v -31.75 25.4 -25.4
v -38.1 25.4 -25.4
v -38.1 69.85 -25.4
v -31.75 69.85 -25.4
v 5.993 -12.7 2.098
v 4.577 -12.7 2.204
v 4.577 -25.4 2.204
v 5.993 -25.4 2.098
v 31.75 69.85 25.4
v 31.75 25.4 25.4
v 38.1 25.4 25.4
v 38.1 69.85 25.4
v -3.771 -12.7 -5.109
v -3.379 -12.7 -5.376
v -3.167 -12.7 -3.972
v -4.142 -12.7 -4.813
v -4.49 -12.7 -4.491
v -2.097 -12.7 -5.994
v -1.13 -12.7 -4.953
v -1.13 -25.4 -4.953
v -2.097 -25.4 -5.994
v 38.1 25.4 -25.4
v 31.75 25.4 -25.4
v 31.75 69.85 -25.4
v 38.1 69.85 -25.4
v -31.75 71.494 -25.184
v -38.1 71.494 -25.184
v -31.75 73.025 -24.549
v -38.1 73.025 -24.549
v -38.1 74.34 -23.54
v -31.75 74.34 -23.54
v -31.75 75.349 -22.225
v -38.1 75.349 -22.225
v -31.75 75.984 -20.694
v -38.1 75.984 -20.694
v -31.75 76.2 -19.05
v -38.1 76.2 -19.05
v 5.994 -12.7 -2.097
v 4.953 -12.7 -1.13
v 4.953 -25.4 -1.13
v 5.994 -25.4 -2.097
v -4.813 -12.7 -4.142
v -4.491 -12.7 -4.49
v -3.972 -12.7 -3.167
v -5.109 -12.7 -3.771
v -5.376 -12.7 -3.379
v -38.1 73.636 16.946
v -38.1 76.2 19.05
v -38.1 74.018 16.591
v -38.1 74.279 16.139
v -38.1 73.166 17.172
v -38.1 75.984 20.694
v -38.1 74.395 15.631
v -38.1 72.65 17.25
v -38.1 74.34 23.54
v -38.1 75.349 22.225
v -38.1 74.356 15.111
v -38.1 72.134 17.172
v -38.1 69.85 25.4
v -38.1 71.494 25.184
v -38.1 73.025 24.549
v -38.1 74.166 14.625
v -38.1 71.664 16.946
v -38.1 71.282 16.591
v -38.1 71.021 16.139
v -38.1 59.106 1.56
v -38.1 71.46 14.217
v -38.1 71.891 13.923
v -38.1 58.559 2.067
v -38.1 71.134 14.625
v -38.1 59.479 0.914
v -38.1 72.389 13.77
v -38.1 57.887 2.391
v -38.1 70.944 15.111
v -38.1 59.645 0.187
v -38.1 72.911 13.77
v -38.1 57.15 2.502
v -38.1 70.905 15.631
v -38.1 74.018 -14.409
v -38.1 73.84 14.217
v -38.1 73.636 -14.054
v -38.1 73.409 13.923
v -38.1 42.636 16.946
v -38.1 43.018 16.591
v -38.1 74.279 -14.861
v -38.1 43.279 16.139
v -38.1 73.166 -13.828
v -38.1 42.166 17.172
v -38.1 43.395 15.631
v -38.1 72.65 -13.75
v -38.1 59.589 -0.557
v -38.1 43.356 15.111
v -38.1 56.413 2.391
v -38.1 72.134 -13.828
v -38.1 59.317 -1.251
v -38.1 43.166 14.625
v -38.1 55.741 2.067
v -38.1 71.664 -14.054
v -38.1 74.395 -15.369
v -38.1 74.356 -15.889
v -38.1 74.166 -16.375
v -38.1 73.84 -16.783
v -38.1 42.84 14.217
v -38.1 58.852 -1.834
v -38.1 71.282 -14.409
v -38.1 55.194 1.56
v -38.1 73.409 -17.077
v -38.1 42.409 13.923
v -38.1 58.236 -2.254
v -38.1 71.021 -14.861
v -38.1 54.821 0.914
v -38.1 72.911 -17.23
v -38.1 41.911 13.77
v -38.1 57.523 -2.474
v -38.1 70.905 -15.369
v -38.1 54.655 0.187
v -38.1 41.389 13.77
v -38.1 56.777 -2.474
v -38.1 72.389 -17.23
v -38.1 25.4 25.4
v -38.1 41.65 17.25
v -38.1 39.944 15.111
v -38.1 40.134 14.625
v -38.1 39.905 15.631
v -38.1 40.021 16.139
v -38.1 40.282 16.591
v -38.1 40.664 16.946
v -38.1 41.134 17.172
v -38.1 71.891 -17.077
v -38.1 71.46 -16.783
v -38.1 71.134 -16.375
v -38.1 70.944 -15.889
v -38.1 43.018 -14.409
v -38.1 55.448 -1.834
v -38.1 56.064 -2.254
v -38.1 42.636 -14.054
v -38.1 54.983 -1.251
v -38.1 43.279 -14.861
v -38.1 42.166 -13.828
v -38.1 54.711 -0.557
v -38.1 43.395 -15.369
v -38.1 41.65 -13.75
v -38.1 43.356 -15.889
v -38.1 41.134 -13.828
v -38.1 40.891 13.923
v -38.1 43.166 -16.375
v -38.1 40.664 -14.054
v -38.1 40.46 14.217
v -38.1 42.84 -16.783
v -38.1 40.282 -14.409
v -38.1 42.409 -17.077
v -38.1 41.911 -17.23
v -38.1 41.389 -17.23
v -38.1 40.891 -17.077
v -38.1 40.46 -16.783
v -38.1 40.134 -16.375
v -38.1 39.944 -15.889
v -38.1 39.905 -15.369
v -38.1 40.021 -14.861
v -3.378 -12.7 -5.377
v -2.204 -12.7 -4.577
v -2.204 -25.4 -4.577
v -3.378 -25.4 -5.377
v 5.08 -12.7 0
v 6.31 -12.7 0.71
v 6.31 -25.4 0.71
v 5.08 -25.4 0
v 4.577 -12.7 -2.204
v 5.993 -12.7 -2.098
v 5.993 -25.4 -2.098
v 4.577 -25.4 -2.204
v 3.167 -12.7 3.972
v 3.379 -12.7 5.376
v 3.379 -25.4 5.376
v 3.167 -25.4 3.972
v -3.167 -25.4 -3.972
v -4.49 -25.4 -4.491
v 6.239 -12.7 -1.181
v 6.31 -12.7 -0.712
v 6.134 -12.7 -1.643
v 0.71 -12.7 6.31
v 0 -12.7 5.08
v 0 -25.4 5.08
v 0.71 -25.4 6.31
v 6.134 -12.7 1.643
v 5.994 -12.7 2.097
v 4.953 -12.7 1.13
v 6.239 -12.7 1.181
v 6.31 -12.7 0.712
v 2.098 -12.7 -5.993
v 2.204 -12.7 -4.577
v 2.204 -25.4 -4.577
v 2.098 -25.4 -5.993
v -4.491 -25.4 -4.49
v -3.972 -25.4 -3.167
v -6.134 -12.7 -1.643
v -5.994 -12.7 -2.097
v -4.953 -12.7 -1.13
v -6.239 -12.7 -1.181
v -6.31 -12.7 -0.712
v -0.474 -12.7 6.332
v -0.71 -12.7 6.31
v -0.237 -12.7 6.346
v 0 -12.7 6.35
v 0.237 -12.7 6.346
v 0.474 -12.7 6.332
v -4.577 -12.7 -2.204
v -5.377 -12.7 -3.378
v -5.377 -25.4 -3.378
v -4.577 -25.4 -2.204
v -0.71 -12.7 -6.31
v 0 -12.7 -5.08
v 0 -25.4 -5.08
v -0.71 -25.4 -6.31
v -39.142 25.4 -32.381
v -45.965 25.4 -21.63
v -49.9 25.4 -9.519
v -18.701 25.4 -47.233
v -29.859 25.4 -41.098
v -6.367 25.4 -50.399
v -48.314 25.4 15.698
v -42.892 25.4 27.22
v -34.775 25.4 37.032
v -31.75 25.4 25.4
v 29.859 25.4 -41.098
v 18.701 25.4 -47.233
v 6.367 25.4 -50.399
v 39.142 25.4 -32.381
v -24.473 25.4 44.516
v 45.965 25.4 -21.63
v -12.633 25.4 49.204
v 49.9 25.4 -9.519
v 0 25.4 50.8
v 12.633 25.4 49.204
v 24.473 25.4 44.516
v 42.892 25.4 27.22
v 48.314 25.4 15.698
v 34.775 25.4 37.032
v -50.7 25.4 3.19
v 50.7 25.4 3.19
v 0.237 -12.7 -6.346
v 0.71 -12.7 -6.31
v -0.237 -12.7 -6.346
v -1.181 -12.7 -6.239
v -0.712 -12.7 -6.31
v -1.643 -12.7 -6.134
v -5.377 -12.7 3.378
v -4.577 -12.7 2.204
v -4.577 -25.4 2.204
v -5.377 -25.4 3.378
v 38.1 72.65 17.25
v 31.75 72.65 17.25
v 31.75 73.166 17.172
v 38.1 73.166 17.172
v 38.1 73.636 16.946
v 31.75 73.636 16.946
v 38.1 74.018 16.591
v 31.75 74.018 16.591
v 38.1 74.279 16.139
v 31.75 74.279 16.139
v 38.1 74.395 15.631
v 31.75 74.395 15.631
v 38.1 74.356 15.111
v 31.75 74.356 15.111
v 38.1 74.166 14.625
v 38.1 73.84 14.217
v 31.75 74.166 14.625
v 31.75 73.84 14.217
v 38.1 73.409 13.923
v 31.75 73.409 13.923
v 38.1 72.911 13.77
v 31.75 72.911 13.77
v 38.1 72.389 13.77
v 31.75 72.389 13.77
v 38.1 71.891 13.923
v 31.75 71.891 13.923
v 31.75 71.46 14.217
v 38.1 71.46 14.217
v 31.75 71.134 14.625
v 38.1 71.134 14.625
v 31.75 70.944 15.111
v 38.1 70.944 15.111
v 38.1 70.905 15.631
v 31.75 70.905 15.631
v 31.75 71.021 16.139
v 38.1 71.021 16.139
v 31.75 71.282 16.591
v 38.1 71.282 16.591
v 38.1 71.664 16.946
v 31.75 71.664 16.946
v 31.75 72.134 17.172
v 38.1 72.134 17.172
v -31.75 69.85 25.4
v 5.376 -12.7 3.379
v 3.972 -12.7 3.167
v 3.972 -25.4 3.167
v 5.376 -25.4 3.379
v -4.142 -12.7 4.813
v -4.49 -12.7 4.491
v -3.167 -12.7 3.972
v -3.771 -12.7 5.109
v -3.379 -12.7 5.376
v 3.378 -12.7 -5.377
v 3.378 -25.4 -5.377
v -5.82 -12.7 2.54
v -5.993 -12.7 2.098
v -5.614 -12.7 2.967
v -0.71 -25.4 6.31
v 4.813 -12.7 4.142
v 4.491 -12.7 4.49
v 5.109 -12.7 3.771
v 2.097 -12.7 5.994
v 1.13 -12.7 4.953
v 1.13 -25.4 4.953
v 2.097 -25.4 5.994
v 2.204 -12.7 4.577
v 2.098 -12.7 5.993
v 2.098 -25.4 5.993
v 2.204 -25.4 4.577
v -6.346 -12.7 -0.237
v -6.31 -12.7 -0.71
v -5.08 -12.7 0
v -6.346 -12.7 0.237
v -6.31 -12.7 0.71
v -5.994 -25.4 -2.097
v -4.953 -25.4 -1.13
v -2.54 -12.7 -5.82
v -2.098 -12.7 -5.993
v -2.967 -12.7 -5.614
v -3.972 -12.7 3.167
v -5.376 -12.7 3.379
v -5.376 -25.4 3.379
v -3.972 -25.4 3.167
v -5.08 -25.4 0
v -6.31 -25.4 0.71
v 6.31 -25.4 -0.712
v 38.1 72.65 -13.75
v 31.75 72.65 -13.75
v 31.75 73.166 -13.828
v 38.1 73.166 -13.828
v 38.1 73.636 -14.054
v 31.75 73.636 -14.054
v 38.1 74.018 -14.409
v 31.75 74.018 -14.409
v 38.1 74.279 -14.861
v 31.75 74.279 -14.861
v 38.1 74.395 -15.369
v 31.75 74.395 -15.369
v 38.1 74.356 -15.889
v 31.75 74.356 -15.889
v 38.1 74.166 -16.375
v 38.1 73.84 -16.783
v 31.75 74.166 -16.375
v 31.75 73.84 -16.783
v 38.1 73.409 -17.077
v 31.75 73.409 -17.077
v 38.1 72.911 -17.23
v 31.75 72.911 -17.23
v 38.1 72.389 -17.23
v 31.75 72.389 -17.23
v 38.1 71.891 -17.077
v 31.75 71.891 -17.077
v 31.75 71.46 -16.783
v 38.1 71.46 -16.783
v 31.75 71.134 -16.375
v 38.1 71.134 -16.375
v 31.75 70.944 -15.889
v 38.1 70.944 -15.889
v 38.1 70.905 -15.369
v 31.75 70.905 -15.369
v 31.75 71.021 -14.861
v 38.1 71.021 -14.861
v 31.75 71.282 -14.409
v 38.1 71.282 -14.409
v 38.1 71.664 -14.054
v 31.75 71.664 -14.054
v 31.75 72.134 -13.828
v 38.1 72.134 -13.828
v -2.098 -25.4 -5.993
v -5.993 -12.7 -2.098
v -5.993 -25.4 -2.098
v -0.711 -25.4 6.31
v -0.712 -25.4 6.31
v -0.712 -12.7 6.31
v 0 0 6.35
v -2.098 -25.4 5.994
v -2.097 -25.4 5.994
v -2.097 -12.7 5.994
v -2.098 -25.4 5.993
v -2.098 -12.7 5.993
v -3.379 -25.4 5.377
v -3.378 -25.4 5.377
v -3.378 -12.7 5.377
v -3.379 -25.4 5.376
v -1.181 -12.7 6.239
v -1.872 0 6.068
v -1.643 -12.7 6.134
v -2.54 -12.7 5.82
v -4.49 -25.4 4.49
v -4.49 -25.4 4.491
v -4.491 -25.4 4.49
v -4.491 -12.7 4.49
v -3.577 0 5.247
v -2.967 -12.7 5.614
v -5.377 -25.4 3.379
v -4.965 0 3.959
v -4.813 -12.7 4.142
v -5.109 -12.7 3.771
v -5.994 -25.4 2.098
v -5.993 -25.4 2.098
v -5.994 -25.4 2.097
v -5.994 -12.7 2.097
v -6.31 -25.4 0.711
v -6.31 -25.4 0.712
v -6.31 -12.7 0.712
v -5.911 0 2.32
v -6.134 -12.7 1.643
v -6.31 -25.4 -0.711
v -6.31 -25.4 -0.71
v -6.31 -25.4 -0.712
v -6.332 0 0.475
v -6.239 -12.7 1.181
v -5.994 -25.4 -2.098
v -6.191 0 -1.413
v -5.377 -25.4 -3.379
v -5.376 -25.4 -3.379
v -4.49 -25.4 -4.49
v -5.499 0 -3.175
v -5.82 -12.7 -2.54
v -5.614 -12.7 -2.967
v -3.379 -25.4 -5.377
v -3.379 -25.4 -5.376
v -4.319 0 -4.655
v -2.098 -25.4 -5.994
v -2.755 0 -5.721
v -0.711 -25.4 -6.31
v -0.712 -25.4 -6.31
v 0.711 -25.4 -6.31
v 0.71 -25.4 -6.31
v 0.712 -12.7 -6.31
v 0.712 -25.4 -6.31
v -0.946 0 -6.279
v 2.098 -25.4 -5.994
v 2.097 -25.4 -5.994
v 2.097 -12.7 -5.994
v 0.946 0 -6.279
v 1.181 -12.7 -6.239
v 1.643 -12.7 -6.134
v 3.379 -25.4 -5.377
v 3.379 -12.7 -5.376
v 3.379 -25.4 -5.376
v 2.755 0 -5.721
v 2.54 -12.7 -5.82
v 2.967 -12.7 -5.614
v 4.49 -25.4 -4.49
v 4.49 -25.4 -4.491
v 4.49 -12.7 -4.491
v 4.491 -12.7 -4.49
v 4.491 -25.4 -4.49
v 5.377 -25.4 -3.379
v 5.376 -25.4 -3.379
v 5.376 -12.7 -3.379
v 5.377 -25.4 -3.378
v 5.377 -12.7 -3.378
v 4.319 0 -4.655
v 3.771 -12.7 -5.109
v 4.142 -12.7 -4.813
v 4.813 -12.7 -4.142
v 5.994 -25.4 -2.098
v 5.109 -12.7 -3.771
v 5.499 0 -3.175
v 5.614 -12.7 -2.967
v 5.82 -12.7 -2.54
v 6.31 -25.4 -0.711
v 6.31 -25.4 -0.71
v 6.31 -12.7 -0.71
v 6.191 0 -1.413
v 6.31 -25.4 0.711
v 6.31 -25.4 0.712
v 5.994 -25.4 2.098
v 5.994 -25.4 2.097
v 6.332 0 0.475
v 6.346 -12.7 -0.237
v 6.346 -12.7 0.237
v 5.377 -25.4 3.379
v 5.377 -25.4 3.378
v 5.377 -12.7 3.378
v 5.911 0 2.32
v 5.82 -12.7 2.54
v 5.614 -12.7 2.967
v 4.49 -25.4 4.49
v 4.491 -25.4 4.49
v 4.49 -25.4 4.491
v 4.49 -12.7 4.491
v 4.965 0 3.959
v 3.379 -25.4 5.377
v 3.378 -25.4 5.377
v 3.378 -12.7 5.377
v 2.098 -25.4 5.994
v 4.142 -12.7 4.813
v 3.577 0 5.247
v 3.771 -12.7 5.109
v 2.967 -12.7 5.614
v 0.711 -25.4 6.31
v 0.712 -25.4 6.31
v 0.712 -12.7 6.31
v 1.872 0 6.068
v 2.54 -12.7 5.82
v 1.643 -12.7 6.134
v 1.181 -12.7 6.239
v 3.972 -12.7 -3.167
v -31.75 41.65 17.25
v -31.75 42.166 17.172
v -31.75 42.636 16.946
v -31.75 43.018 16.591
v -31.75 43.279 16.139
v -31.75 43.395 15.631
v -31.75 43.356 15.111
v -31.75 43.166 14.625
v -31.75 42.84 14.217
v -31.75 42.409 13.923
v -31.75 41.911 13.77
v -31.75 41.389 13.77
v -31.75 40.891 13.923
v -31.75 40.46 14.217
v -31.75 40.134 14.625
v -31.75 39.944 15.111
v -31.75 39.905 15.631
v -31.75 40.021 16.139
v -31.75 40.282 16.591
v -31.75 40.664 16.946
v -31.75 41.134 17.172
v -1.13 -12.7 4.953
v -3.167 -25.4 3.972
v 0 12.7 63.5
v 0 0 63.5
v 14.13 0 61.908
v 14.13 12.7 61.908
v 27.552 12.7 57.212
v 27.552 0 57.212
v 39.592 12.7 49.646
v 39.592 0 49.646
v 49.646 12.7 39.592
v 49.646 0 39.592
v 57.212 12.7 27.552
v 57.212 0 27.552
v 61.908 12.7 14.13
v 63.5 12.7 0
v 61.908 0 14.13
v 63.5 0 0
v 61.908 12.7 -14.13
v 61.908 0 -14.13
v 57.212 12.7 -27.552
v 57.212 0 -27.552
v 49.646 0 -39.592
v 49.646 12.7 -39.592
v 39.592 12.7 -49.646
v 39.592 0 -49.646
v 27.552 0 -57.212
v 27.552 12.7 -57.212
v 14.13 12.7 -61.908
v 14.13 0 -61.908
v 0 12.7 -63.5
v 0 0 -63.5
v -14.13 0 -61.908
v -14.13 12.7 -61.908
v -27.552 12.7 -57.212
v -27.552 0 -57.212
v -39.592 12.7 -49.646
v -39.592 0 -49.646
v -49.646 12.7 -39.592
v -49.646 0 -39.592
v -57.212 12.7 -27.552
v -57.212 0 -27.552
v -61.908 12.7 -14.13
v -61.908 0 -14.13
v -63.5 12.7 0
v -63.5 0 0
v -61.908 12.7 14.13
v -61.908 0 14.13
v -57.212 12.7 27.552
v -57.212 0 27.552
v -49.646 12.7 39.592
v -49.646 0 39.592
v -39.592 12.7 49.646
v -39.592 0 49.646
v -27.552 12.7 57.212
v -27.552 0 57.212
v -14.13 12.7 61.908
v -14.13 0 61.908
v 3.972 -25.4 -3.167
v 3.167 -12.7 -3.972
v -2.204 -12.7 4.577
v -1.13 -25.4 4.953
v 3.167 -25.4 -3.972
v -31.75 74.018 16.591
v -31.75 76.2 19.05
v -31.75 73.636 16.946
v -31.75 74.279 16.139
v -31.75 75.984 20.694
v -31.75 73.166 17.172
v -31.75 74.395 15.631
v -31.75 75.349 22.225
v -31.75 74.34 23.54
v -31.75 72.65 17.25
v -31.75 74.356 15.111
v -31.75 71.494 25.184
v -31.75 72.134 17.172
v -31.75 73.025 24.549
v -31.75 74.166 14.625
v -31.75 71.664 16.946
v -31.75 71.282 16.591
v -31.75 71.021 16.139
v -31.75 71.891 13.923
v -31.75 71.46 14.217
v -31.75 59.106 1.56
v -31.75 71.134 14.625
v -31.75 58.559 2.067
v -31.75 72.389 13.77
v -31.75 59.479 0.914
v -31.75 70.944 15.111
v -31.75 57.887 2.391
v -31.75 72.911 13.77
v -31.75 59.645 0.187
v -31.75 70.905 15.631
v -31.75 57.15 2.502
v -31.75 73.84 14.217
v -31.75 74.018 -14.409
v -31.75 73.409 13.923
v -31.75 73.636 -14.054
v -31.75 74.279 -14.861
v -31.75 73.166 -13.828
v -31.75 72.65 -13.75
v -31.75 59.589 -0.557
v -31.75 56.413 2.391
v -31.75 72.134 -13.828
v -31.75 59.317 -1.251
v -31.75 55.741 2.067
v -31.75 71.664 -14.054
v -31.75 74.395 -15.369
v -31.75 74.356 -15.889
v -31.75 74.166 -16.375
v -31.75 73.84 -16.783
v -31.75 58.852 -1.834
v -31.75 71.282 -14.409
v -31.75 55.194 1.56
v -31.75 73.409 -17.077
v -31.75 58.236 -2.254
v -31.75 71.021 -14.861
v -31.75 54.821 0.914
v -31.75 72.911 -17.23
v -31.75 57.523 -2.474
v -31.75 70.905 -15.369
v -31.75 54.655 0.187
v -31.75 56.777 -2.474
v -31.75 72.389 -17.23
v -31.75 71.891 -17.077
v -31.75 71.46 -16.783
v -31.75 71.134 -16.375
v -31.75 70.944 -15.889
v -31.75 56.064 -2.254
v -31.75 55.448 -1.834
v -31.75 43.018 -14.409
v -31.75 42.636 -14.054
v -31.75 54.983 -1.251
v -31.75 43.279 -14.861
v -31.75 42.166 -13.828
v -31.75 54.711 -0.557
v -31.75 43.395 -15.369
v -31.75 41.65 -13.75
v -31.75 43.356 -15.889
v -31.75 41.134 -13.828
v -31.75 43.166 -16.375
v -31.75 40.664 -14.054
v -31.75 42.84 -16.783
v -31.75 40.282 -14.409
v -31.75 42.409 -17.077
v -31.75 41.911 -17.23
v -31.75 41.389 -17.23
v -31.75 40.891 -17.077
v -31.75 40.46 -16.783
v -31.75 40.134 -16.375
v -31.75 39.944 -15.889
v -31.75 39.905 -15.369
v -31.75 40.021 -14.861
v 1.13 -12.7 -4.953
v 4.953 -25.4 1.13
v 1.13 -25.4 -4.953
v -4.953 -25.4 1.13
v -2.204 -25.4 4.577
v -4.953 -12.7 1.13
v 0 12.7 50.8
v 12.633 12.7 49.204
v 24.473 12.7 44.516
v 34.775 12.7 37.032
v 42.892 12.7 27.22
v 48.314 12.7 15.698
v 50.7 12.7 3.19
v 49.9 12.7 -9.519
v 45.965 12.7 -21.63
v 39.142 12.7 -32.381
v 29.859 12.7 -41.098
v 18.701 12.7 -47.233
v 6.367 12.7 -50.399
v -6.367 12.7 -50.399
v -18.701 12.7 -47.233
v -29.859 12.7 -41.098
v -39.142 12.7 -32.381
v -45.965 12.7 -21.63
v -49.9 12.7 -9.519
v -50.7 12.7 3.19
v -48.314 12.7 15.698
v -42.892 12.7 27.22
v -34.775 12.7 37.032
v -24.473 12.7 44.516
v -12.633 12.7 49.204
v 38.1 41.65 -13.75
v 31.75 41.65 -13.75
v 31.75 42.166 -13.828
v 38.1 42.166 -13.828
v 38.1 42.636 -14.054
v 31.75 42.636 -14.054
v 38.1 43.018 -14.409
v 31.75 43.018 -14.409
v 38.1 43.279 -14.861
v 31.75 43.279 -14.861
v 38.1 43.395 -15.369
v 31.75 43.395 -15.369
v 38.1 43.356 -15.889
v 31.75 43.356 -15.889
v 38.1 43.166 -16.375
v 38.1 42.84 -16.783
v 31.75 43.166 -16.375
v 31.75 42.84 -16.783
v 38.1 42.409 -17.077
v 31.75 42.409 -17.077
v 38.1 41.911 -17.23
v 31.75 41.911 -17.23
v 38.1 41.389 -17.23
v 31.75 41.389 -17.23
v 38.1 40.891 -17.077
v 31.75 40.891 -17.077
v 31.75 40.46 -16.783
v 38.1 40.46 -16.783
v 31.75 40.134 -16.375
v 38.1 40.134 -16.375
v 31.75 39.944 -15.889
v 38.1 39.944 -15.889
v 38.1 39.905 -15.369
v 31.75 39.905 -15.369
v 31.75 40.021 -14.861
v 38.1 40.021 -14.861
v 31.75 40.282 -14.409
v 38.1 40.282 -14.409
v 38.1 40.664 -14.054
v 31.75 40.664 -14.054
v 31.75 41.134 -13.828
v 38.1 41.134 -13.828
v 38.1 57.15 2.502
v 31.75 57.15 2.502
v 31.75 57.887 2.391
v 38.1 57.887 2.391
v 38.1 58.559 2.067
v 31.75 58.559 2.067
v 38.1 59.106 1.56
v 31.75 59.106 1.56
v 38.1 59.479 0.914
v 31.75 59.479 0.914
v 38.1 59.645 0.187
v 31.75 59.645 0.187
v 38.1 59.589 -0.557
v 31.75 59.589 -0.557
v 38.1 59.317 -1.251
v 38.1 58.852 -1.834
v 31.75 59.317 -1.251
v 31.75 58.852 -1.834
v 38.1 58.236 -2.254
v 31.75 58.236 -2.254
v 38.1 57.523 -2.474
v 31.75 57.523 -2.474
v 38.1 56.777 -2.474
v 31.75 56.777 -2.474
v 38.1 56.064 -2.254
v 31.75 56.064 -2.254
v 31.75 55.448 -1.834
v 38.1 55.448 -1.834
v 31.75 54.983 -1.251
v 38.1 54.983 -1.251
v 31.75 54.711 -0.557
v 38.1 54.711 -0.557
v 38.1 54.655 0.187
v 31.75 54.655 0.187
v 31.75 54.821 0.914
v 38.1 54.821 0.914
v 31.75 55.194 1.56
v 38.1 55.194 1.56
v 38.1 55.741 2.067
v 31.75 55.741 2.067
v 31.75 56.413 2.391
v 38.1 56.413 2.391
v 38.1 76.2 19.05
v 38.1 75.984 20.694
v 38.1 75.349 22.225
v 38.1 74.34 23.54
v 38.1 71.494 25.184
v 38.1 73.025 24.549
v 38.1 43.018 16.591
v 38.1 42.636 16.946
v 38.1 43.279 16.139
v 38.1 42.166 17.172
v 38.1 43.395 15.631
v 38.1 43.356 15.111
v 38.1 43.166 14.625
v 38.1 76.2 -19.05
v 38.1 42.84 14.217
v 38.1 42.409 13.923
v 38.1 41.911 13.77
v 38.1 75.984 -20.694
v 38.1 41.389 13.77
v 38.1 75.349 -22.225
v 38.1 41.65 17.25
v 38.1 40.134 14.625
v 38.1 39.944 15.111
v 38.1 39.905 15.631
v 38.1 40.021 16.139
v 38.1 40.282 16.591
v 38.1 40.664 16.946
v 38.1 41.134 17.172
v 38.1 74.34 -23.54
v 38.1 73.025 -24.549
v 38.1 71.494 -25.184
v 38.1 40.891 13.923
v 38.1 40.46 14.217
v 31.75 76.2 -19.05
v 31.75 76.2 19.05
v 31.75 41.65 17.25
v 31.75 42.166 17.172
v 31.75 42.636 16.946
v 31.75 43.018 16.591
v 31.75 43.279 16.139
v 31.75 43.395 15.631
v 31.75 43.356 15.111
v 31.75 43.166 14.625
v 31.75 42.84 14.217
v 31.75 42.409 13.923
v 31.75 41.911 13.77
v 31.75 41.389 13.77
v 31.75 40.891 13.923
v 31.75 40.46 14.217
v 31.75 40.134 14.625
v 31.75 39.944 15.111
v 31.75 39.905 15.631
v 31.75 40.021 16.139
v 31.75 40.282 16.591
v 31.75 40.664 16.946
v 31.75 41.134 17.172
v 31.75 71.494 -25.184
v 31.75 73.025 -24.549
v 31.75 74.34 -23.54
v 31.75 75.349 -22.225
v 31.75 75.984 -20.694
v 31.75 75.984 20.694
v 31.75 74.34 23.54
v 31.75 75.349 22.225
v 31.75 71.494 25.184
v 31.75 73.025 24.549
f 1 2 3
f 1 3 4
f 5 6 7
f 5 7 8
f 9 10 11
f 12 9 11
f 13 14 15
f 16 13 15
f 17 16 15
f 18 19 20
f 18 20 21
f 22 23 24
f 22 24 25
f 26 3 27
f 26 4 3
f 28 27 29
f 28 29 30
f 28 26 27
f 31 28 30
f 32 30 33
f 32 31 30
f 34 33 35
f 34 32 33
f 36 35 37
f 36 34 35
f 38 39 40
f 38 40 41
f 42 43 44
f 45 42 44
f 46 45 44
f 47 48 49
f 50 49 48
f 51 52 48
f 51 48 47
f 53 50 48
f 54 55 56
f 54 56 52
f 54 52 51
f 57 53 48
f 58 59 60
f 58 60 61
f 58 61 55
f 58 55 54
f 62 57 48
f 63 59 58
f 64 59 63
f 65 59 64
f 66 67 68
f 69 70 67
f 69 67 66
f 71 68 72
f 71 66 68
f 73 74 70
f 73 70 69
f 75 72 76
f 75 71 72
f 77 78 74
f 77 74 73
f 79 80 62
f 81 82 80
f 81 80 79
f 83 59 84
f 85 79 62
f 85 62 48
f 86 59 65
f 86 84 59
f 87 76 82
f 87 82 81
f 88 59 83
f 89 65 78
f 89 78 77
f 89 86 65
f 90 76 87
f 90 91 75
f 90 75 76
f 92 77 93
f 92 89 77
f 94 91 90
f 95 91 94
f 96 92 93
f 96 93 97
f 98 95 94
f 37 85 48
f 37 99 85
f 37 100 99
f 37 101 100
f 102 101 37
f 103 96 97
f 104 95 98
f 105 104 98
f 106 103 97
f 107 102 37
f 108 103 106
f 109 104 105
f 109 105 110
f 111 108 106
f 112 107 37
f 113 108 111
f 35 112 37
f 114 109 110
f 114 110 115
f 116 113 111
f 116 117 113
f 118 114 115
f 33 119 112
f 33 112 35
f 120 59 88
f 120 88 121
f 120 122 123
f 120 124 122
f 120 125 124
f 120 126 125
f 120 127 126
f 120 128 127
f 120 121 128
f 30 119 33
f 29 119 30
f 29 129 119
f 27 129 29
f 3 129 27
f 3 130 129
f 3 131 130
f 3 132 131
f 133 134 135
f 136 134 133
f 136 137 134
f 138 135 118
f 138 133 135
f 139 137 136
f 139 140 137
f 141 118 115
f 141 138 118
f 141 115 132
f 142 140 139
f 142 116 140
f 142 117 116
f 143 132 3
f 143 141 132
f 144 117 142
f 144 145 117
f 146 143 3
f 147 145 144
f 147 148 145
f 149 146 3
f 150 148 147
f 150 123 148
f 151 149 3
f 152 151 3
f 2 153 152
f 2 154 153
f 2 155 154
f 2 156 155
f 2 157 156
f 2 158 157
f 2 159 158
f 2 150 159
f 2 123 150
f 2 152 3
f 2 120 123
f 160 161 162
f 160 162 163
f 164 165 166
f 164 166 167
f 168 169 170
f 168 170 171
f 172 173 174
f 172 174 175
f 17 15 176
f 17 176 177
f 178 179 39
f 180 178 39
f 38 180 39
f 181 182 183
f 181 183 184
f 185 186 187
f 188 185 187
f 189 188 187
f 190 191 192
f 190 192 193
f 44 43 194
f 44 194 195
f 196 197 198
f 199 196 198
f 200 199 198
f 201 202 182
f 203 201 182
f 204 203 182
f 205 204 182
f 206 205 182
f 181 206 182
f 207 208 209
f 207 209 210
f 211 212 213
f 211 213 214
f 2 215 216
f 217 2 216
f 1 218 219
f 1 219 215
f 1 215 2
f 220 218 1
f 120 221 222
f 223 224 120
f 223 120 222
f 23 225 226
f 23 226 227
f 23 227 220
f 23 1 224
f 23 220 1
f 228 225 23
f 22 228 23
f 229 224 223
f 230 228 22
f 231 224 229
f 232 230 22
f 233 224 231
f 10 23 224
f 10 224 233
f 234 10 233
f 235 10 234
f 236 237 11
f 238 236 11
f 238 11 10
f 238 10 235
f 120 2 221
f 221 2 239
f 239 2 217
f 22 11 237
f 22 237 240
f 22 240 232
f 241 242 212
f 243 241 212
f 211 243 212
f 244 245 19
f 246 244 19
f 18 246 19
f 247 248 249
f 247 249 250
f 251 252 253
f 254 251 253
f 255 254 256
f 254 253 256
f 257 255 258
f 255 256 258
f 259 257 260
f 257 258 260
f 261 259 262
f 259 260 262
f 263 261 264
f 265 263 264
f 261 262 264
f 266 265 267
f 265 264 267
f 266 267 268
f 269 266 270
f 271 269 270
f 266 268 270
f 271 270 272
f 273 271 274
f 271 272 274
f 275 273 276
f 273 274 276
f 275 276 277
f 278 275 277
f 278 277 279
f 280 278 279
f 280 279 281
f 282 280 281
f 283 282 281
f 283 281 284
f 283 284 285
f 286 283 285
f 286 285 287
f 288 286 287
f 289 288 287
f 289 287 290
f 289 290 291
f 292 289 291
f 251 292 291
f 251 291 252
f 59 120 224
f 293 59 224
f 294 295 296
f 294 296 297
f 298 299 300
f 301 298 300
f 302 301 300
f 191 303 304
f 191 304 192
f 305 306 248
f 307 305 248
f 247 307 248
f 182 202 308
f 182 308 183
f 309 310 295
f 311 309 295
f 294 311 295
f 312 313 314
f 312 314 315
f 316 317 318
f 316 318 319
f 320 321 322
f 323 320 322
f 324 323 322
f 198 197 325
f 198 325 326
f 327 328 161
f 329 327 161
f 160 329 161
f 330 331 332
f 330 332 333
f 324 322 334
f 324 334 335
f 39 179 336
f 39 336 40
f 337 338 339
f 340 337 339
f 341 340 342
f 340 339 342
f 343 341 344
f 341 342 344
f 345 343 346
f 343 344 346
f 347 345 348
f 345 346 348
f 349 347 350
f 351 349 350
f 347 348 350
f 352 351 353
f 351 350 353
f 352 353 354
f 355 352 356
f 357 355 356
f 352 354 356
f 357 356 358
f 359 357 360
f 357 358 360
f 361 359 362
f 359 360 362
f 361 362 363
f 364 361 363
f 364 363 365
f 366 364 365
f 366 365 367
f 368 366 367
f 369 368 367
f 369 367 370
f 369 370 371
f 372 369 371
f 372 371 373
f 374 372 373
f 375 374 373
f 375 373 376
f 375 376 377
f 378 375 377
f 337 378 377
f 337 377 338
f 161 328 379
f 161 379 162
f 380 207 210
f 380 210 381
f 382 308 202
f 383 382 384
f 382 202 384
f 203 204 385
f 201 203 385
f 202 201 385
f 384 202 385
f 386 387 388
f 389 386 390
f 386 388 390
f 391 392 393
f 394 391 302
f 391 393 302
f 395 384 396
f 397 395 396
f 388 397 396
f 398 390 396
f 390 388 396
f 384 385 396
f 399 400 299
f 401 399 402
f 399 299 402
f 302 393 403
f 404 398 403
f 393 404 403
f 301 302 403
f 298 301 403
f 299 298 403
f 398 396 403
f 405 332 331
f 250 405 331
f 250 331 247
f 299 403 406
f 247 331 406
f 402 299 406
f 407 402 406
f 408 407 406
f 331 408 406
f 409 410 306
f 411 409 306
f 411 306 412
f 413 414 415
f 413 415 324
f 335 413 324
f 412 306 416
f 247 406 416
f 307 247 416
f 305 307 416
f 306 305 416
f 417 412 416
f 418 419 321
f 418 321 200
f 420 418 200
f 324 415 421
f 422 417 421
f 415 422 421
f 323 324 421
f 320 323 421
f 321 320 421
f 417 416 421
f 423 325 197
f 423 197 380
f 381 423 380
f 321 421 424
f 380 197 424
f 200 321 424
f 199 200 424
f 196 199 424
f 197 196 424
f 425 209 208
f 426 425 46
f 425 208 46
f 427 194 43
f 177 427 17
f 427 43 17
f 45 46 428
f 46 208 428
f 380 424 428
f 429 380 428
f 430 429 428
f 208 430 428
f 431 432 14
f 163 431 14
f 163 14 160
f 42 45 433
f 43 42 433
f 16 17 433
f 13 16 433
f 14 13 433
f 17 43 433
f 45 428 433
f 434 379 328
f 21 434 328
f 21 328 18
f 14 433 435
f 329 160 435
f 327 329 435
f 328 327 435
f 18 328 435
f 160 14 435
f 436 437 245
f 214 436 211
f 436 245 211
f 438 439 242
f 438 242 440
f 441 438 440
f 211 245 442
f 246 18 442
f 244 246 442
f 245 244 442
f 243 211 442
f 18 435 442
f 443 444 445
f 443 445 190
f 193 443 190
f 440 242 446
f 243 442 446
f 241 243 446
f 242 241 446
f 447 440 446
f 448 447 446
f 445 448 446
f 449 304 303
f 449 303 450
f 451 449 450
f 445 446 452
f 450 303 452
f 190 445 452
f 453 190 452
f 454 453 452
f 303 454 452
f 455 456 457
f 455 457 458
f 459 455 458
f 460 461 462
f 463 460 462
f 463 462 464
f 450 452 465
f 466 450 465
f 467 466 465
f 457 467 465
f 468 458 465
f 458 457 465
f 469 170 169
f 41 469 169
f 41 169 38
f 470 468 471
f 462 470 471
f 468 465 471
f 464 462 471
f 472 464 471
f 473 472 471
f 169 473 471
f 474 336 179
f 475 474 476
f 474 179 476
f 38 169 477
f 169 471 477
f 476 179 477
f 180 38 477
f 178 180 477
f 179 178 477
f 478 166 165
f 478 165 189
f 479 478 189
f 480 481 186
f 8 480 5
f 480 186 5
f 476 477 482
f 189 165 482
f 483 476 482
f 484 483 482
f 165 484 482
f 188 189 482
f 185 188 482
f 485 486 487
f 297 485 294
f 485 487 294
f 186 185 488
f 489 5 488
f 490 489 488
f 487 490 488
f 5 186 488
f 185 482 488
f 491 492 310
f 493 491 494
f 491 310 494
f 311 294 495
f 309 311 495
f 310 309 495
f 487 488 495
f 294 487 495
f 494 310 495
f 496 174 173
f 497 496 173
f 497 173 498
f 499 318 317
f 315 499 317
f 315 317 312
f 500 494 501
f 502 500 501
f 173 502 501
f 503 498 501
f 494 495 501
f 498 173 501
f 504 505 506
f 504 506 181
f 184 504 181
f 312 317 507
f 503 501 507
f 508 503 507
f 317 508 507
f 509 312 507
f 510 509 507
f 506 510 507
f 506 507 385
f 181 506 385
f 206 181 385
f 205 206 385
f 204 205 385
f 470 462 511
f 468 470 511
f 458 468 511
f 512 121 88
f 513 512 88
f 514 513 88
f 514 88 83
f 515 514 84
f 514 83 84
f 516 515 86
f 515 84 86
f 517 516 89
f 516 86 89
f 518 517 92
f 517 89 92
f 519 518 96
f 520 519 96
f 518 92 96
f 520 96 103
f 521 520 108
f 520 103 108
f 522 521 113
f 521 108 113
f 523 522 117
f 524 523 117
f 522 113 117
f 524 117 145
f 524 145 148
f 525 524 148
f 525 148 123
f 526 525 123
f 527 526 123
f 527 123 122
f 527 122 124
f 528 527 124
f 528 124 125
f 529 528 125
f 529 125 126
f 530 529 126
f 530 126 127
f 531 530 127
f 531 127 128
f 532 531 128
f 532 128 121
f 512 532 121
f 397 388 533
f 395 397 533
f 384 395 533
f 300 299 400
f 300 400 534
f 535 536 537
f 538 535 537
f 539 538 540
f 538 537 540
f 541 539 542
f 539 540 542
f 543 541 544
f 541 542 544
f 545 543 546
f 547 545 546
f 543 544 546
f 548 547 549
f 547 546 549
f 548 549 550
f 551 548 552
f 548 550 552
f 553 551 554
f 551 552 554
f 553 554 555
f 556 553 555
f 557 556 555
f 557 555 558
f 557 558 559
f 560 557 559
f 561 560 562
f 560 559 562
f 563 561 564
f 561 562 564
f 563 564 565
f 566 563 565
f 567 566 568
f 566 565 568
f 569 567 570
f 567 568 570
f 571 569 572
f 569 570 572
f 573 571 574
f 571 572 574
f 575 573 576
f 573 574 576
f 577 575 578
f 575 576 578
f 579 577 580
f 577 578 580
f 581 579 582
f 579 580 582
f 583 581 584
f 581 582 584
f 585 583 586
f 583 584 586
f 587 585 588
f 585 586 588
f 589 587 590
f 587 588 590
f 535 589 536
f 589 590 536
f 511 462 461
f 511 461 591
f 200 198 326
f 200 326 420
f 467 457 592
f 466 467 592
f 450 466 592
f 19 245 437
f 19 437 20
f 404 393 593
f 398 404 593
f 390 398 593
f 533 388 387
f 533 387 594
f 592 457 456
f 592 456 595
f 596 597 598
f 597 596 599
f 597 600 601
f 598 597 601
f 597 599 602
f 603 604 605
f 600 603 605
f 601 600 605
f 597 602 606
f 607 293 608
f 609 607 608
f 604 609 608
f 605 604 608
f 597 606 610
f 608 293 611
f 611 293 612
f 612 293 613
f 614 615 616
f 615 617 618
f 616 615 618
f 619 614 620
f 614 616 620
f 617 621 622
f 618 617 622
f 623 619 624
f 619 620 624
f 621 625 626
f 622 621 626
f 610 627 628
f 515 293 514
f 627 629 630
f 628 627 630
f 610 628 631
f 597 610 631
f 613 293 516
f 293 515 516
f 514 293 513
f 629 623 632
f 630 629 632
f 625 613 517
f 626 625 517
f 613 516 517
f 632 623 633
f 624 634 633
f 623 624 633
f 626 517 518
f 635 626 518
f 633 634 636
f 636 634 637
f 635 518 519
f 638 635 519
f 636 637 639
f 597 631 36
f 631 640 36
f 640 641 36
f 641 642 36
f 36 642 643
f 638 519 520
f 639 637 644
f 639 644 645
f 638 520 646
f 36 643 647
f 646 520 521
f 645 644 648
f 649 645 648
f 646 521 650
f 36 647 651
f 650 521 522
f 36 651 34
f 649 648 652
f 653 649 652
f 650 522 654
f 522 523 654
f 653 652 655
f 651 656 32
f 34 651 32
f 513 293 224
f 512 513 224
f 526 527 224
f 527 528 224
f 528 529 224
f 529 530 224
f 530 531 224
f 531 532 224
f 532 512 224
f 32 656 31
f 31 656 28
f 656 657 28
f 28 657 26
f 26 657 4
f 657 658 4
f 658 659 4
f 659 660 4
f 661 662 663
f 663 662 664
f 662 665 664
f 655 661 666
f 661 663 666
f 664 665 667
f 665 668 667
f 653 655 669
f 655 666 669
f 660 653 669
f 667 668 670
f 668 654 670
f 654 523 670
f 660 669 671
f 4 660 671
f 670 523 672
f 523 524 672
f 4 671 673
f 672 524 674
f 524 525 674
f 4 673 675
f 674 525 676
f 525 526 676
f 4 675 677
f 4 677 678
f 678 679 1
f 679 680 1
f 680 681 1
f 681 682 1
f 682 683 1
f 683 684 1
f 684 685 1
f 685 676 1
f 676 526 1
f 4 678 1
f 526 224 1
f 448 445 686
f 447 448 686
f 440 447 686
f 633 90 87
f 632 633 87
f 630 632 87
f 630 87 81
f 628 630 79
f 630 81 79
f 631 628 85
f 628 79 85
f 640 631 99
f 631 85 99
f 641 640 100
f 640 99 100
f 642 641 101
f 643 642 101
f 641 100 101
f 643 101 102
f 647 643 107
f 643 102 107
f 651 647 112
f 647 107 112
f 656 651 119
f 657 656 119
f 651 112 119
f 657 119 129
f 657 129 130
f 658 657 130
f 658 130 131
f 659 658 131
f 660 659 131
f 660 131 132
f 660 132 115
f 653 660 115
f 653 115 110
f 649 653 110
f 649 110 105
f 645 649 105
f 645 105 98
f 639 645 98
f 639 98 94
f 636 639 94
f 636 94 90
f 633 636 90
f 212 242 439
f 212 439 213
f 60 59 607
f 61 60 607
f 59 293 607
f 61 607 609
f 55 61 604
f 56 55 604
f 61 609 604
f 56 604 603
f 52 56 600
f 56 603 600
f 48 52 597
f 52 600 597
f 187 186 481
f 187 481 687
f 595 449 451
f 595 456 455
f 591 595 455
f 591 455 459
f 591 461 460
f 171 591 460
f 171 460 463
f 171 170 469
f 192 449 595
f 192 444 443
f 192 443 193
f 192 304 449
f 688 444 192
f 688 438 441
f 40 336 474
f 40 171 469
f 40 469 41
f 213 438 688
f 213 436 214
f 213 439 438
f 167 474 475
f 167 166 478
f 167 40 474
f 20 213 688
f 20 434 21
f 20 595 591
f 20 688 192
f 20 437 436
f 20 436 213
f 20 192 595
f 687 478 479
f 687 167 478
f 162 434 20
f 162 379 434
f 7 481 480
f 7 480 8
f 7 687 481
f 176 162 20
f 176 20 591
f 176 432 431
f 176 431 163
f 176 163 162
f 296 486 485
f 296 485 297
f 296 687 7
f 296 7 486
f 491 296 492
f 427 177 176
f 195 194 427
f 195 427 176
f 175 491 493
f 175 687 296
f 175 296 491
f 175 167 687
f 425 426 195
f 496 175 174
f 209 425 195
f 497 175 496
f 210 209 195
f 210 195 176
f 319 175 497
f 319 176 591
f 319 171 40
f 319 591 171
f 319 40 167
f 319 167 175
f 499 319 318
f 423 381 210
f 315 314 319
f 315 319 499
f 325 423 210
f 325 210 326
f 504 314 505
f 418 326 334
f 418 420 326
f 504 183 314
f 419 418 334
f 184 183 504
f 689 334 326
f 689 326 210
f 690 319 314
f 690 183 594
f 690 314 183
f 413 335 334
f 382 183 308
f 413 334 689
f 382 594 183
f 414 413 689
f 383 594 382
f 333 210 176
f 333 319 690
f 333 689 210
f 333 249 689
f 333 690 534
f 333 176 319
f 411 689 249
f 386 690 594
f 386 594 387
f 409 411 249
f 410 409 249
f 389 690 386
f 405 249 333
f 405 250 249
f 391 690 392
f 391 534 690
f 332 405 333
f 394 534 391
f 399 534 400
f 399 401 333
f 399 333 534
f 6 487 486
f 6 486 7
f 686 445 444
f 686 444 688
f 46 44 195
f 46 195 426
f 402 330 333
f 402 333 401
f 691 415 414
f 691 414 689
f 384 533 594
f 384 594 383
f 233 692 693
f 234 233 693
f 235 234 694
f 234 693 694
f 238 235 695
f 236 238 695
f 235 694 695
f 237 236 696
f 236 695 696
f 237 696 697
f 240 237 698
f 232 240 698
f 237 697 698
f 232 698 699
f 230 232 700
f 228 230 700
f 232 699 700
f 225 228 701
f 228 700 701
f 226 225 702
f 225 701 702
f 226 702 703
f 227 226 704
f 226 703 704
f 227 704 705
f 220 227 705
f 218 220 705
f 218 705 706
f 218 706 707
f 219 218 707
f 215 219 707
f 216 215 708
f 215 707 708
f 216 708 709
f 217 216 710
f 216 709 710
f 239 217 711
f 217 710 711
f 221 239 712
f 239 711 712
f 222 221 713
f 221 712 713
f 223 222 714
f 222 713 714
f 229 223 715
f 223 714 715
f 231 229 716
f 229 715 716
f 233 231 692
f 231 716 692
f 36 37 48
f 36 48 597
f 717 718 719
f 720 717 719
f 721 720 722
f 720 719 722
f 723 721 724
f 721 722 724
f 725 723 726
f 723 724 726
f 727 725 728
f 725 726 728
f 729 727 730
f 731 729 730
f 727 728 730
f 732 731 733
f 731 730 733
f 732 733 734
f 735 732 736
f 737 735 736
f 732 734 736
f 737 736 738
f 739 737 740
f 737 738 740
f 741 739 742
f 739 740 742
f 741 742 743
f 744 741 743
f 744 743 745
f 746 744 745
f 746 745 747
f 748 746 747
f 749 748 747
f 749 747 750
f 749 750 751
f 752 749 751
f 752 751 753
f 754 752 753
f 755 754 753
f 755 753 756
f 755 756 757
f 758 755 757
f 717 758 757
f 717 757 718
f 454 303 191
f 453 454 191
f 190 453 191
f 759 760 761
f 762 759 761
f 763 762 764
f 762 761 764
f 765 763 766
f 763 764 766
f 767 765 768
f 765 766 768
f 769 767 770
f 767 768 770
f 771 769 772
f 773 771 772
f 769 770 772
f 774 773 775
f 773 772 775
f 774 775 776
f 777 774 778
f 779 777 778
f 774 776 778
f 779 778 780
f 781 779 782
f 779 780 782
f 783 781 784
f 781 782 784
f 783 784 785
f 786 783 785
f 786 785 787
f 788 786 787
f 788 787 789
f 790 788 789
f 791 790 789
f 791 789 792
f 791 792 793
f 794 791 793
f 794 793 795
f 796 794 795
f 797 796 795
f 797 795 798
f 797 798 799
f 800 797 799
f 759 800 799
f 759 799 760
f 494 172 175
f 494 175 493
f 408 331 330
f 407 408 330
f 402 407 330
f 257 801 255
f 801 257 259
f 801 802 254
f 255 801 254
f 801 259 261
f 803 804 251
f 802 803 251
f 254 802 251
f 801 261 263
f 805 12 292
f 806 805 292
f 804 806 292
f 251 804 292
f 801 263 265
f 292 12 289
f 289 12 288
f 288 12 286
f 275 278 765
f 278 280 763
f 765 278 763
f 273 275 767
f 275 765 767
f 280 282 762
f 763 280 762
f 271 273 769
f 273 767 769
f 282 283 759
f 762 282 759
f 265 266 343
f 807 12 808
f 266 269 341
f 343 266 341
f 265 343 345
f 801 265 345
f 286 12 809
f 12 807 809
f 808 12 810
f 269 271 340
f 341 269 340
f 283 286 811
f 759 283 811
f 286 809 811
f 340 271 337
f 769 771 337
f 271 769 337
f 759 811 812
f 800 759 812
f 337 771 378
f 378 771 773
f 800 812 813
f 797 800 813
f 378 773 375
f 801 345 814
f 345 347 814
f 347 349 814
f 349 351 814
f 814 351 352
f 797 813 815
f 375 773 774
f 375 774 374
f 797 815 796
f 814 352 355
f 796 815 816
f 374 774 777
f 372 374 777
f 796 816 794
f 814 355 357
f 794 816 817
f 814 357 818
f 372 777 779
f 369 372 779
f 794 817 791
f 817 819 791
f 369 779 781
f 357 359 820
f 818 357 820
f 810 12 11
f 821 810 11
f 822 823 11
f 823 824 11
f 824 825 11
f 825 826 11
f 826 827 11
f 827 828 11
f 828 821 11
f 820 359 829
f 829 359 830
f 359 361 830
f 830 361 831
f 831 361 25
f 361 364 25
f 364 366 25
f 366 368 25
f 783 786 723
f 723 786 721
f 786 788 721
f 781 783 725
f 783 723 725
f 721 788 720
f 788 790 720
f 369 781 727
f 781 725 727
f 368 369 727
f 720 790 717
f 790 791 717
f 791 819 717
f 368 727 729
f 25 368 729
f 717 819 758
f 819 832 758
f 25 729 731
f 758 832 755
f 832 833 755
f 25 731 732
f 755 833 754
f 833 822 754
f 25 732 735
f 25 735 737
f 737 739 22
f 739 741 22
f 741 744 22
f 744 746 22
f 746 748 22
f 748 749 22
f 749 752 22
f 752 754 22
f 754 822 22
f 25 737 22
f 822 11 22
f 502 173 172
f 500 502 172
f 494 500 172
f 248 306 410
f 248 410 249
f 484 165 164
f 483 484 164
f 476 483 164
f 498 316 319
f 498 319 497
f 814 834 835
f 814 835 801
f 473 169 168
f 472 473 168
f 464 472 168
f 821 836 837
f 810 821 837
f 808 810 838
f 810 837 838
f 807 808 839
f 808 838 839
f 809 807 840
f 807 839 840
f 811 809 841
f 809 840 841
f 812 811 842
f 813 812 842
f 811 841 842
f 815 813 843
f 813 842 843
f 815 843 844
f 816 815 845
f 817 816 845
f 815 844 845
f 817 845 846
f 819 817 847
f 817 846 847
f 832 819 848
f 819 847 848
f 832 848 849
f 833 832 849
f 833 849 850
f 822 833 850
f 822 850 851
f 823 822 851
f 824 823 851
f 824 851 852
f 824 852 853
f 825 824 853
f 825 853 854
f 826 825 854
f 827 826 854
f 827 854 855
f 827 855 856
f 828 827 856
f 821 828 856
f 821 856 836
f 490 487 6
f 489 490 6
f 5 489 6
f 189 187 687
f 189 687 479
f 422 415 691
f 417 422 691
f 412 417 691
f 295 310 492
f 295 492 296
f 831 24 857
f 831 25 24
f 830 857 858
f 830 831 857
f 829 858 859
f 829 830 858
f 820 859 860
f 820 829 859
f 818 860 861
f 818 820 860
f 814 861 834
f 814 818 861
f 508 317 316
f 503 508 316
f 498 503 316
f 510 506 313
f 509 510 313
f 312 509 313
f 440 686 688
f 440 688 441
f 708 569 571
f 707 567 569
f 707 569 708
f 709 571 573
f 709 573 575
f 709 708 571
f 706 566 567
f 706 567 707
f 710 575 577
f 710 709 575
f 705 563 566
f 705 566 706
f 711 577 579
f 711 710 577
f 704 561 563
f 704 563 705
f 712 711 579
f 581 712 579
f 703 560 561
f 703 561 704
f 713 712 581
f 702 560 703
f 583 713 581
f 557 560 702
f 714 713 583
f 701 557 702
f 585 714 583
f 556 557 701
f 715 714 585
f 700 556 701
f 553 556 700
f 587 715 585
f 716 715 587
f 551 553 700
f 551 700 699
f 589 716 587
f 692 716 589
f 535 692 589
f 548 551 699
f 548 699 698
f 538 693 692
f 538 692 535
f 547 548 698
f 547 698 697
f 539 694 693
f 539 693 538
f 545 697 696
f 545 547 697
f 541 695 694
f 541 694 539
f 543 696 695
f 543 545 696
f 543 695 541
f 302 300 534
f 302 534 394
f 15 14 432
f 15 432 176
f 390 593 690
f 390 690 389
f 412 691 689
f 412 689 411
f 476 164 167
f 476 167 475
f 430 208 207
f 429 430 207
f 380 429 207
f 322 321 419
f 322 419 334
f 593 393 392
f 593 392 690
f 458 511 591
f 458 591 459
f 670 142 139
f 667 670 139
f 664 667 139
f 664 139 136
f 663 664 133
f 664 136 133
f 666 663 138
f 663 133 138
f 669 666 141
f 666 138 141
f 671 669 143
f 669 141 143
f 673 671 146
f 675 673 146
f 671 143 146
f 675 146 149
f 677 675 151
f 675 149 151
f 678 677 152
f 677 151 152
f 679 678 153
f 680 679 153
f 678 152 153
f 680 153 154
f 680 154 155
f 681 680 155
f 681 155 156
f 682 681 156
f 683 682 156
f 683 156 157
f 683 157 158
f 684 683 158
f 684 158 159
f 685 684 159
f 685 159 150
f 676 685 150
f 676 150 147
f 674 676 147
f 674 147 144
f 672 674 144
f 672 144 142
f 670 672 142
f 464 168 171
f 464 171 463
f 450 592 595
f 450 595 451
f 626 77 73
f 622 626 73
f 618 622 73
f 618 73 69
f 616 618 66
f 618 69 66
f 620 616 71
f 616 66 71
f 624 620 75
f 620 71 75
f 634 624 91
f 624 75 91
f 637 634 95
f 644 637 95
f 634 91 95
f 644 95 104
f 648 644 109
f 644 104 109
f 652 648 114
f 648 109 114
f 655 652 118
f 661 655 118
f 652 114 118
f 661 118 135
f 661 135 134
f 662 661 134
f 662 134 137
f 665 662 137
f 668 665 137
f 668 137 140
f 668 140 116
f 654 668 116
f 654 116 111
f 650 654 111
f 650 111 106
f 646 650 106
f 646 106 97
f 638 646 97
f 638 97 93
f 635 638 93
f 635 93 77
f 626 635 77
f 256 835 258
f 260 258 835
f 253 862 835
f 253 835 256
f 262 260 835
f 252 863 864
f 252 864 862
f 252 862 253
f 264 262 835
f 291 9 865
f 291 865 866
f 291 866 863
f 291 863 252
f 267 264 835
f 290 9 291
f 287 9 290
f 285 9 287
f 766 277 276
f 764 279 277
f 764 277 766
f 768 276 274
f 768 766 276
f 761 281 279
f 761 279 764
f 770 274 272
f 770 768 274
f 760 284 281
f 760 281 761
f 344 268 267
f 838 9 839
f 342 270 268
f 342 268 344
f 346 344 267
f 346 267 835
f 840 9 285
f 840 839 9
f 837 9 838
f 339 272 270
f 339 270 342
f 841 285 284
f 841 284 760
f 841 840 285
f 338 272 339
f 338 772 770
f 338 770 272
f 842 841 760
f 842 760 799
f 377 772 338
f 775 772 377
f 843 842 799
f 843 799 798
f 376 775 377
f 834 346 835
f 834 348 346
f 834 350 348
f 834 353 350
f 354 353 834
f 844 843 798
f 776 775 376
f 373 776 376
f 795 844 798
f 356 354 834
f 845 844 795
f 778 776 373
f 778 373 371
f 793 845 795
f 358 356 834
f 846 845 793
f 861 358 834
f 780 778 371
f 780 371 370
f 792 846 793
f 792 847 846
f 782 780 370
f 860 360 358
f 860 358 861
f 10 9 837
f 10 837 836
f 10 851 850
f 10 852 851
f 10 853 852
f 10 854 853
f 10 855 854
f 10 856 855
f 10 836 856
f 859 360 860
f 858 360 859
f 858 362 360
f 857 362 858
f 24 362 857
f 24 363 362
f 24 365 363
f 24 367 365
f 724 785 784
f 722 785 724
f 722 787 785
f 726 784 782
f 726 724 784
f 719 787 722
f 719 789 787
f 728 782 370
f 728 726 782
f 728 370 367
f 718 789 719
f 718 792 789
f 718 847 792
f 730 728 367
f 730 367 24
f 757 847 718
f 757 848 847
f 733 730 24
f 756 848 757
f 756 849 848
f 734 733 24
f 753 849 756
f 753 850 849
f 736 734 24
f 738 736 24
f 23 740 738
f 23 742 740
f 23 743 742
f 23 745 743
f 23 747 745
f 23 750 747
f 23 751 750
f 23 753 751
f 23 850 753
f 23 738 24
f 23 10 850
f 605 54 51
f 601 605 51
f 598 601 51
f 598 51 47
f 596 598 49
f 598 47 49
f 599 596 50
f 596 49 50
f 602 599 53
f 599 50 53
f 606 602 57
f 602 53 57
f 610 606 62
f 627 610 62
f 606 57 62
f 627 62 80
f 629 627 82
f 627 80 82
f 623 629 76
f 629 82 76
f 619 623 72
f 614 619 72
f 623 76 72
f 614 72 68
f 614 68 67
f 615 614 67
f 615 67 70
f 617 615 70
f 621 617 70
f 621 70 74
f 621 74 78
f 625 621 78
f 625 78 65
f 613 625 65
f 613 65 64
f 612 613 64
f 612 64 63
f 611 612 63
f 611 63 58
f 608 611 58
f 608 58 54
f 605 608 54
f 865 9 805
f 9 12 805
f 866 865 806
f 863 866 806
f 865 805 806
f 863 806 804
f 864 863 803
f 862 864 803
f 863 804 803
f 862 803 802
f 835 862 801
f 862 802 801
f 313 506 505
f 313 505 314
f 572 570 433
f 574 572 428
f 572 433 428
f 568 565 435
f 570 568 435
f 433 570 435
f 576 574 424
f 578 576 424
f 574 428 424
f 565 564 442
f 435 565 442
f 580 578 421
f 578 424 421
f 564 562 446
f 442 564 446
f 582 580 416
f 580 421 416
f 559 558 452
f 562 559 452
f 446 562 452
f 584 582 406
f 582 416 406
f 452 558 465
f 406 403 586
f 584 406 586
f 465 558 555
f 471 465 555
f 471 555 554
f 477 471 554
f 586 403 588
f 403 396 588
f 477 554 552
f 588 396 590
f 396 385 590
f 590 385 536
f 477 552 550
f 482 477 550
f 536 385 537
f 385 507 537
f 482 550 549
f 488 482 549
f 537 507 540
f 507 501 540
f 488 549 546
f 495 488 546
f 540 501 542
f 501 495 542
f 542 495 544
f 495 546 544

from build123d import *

# Parameters (mm, degrees)
SKETCH2_R           = 63.5
BOSS_EXTRUDE1_DEPTH = 12.7
SKETCH3_R           = 50.8
BOSS_EXTRUDE2_DEPTH = 12.7
SKETCH4_R           = 6.35
BOSS_EXTRUDE3_DEPTH = 25.4
SKETCH5_W           = 6.35
SKETCH5_H           = 50.8
BOSS_EXTRUDE4_DEPTH = 50.8
FILLET1_R           = 6.35
SKETCH6_R           = 2.5019
SKETCH6_R_2         = 1.75
CUT_EXTRUDE1_DEPTH  = 142.990316571
CUT_EXTRUDE2_START  = -12.7
CUT_EXTRUDE2_DEPTH  = 12.7
CIRPATTERN1_COUNT   = 28


with BuildPart() as part:
    # Sketch2 → Boss-Extrude1 (new body)
    with BuildSketch(Plane(origin=(0, 0, 0), x_dir=(1, 0, 0), z_dir=(0, 1, 0))):
        with Locations(Location((0, 0, 0), (0, 0, 270))):
            Circle(SKETCH2_R)
    extrude(amount=BOSS_EXTRUDE1_DEPTH)

    # Sketch3 → Boss-Extrude2 (add)
    with BuildSketch(Plane(origin=(0, 12.7, 0), x_dir=(1, 0, 0), z_dir=(0, 1, 0))):
        with Locations(Location((0, 0, 0), (0, 0, 270))):
            Circle(SKETCH3_R)
    extrude(amount=BOSS_EXTRUDE2_DEPTH)

    # Sketch4 → Boss-Extrude3 (add)
    with BuildSketch(Plane.XZ):
        with Locations(Location((0, 0, 0), (0, 0, 90))):
            Circle(SKETCH4_R)
    extrude(amount=BOSS_EXTRUDE3_DEPTH)

    # Sketch5 → Boss-Extrude4 (add)
    with BuildSketch(Plane(origin=(0, 25.4, 0), x_dir=(1, 0, 0), z_dir=(0, 1, 0))):
        with Locations((34.925, 0)):
            Rectangle(SKETCH5_W, SKETCH5_H)
        with Locations((-34.925, 0)):
            Rectangle(SKETCH5_W, SKETCH5_H)
    extrude(amount=BOSS_EXTRUDE4_DEPTH)

    # Fillet1
    fillet1_edges = [part.edges().sort_by_distance(p)[0] for p in [
        (-34.925, 76.2, 25.4),
        (-34.925, 76.2, -25.4),
        (34.925, 76.2, -25.4),
        (34.925, 76.2, 25.4),
    ]]
    fillet(fillet1_edges, radius=FILLET1_R)

    # Sketch6 → Cut-Extrude1 (cut, through all)
    with BuildSketch(Plane.ZY.offset(38.1)):
        with Locations((0, 57.15)):
            Circle(SKETCH6_R)
        with Locations((-15.5, 41.65)):
            Circle(SKETCH6_R_2)
        with Locations((15.499999976, 41.65)):
            Circle(SKETCH6_R_2)
        with Locations((15.499999976, 72.649999976)):
            Circle(SKETCH6_R_2)
        with Locations((-15.5, 72.649999976)):
            Circle(SKETCH6_R_2)
    extrude(amount=-CUT_EXTRUDE1_DEPTH, mode=Mode.SUBTRACT)

    # Sketch7 → Cut-Extrude2 (cut)
    with BuildSketch(Plane.XZ.offset(25.4).offset(CUT_EXTRUDE2_START)):
        with BuildLine():
            Line((0, 5.08), (0.710231041, 6.310156248))
            ThreePointArc((0.710231041, 6.310156248), (0, 6.35), (-0.710231041, 6.310156248))
            Line((-0.710231041, 6.310156248), (0, 5.08))
        make_face()
    cut_extrude2 = extrude(amount=CUT_EXTRUDE2_DEPTH, mode=Mode.SUBTRACT)

    # CirPattern1: Cut-Extrude2 ×28 about axis
    cirpattern1_axis = Axis((0, 0, 0), (0, 1, 0))
    for i in range(1, CIRPATTERN1_COUNT):
        add(cut_extrude2.rotate(cirpattern1_axis, i * 360 / CIRPATTERN1_COUNT), mode=Mode.SUBTRACT)


solid = part.part
